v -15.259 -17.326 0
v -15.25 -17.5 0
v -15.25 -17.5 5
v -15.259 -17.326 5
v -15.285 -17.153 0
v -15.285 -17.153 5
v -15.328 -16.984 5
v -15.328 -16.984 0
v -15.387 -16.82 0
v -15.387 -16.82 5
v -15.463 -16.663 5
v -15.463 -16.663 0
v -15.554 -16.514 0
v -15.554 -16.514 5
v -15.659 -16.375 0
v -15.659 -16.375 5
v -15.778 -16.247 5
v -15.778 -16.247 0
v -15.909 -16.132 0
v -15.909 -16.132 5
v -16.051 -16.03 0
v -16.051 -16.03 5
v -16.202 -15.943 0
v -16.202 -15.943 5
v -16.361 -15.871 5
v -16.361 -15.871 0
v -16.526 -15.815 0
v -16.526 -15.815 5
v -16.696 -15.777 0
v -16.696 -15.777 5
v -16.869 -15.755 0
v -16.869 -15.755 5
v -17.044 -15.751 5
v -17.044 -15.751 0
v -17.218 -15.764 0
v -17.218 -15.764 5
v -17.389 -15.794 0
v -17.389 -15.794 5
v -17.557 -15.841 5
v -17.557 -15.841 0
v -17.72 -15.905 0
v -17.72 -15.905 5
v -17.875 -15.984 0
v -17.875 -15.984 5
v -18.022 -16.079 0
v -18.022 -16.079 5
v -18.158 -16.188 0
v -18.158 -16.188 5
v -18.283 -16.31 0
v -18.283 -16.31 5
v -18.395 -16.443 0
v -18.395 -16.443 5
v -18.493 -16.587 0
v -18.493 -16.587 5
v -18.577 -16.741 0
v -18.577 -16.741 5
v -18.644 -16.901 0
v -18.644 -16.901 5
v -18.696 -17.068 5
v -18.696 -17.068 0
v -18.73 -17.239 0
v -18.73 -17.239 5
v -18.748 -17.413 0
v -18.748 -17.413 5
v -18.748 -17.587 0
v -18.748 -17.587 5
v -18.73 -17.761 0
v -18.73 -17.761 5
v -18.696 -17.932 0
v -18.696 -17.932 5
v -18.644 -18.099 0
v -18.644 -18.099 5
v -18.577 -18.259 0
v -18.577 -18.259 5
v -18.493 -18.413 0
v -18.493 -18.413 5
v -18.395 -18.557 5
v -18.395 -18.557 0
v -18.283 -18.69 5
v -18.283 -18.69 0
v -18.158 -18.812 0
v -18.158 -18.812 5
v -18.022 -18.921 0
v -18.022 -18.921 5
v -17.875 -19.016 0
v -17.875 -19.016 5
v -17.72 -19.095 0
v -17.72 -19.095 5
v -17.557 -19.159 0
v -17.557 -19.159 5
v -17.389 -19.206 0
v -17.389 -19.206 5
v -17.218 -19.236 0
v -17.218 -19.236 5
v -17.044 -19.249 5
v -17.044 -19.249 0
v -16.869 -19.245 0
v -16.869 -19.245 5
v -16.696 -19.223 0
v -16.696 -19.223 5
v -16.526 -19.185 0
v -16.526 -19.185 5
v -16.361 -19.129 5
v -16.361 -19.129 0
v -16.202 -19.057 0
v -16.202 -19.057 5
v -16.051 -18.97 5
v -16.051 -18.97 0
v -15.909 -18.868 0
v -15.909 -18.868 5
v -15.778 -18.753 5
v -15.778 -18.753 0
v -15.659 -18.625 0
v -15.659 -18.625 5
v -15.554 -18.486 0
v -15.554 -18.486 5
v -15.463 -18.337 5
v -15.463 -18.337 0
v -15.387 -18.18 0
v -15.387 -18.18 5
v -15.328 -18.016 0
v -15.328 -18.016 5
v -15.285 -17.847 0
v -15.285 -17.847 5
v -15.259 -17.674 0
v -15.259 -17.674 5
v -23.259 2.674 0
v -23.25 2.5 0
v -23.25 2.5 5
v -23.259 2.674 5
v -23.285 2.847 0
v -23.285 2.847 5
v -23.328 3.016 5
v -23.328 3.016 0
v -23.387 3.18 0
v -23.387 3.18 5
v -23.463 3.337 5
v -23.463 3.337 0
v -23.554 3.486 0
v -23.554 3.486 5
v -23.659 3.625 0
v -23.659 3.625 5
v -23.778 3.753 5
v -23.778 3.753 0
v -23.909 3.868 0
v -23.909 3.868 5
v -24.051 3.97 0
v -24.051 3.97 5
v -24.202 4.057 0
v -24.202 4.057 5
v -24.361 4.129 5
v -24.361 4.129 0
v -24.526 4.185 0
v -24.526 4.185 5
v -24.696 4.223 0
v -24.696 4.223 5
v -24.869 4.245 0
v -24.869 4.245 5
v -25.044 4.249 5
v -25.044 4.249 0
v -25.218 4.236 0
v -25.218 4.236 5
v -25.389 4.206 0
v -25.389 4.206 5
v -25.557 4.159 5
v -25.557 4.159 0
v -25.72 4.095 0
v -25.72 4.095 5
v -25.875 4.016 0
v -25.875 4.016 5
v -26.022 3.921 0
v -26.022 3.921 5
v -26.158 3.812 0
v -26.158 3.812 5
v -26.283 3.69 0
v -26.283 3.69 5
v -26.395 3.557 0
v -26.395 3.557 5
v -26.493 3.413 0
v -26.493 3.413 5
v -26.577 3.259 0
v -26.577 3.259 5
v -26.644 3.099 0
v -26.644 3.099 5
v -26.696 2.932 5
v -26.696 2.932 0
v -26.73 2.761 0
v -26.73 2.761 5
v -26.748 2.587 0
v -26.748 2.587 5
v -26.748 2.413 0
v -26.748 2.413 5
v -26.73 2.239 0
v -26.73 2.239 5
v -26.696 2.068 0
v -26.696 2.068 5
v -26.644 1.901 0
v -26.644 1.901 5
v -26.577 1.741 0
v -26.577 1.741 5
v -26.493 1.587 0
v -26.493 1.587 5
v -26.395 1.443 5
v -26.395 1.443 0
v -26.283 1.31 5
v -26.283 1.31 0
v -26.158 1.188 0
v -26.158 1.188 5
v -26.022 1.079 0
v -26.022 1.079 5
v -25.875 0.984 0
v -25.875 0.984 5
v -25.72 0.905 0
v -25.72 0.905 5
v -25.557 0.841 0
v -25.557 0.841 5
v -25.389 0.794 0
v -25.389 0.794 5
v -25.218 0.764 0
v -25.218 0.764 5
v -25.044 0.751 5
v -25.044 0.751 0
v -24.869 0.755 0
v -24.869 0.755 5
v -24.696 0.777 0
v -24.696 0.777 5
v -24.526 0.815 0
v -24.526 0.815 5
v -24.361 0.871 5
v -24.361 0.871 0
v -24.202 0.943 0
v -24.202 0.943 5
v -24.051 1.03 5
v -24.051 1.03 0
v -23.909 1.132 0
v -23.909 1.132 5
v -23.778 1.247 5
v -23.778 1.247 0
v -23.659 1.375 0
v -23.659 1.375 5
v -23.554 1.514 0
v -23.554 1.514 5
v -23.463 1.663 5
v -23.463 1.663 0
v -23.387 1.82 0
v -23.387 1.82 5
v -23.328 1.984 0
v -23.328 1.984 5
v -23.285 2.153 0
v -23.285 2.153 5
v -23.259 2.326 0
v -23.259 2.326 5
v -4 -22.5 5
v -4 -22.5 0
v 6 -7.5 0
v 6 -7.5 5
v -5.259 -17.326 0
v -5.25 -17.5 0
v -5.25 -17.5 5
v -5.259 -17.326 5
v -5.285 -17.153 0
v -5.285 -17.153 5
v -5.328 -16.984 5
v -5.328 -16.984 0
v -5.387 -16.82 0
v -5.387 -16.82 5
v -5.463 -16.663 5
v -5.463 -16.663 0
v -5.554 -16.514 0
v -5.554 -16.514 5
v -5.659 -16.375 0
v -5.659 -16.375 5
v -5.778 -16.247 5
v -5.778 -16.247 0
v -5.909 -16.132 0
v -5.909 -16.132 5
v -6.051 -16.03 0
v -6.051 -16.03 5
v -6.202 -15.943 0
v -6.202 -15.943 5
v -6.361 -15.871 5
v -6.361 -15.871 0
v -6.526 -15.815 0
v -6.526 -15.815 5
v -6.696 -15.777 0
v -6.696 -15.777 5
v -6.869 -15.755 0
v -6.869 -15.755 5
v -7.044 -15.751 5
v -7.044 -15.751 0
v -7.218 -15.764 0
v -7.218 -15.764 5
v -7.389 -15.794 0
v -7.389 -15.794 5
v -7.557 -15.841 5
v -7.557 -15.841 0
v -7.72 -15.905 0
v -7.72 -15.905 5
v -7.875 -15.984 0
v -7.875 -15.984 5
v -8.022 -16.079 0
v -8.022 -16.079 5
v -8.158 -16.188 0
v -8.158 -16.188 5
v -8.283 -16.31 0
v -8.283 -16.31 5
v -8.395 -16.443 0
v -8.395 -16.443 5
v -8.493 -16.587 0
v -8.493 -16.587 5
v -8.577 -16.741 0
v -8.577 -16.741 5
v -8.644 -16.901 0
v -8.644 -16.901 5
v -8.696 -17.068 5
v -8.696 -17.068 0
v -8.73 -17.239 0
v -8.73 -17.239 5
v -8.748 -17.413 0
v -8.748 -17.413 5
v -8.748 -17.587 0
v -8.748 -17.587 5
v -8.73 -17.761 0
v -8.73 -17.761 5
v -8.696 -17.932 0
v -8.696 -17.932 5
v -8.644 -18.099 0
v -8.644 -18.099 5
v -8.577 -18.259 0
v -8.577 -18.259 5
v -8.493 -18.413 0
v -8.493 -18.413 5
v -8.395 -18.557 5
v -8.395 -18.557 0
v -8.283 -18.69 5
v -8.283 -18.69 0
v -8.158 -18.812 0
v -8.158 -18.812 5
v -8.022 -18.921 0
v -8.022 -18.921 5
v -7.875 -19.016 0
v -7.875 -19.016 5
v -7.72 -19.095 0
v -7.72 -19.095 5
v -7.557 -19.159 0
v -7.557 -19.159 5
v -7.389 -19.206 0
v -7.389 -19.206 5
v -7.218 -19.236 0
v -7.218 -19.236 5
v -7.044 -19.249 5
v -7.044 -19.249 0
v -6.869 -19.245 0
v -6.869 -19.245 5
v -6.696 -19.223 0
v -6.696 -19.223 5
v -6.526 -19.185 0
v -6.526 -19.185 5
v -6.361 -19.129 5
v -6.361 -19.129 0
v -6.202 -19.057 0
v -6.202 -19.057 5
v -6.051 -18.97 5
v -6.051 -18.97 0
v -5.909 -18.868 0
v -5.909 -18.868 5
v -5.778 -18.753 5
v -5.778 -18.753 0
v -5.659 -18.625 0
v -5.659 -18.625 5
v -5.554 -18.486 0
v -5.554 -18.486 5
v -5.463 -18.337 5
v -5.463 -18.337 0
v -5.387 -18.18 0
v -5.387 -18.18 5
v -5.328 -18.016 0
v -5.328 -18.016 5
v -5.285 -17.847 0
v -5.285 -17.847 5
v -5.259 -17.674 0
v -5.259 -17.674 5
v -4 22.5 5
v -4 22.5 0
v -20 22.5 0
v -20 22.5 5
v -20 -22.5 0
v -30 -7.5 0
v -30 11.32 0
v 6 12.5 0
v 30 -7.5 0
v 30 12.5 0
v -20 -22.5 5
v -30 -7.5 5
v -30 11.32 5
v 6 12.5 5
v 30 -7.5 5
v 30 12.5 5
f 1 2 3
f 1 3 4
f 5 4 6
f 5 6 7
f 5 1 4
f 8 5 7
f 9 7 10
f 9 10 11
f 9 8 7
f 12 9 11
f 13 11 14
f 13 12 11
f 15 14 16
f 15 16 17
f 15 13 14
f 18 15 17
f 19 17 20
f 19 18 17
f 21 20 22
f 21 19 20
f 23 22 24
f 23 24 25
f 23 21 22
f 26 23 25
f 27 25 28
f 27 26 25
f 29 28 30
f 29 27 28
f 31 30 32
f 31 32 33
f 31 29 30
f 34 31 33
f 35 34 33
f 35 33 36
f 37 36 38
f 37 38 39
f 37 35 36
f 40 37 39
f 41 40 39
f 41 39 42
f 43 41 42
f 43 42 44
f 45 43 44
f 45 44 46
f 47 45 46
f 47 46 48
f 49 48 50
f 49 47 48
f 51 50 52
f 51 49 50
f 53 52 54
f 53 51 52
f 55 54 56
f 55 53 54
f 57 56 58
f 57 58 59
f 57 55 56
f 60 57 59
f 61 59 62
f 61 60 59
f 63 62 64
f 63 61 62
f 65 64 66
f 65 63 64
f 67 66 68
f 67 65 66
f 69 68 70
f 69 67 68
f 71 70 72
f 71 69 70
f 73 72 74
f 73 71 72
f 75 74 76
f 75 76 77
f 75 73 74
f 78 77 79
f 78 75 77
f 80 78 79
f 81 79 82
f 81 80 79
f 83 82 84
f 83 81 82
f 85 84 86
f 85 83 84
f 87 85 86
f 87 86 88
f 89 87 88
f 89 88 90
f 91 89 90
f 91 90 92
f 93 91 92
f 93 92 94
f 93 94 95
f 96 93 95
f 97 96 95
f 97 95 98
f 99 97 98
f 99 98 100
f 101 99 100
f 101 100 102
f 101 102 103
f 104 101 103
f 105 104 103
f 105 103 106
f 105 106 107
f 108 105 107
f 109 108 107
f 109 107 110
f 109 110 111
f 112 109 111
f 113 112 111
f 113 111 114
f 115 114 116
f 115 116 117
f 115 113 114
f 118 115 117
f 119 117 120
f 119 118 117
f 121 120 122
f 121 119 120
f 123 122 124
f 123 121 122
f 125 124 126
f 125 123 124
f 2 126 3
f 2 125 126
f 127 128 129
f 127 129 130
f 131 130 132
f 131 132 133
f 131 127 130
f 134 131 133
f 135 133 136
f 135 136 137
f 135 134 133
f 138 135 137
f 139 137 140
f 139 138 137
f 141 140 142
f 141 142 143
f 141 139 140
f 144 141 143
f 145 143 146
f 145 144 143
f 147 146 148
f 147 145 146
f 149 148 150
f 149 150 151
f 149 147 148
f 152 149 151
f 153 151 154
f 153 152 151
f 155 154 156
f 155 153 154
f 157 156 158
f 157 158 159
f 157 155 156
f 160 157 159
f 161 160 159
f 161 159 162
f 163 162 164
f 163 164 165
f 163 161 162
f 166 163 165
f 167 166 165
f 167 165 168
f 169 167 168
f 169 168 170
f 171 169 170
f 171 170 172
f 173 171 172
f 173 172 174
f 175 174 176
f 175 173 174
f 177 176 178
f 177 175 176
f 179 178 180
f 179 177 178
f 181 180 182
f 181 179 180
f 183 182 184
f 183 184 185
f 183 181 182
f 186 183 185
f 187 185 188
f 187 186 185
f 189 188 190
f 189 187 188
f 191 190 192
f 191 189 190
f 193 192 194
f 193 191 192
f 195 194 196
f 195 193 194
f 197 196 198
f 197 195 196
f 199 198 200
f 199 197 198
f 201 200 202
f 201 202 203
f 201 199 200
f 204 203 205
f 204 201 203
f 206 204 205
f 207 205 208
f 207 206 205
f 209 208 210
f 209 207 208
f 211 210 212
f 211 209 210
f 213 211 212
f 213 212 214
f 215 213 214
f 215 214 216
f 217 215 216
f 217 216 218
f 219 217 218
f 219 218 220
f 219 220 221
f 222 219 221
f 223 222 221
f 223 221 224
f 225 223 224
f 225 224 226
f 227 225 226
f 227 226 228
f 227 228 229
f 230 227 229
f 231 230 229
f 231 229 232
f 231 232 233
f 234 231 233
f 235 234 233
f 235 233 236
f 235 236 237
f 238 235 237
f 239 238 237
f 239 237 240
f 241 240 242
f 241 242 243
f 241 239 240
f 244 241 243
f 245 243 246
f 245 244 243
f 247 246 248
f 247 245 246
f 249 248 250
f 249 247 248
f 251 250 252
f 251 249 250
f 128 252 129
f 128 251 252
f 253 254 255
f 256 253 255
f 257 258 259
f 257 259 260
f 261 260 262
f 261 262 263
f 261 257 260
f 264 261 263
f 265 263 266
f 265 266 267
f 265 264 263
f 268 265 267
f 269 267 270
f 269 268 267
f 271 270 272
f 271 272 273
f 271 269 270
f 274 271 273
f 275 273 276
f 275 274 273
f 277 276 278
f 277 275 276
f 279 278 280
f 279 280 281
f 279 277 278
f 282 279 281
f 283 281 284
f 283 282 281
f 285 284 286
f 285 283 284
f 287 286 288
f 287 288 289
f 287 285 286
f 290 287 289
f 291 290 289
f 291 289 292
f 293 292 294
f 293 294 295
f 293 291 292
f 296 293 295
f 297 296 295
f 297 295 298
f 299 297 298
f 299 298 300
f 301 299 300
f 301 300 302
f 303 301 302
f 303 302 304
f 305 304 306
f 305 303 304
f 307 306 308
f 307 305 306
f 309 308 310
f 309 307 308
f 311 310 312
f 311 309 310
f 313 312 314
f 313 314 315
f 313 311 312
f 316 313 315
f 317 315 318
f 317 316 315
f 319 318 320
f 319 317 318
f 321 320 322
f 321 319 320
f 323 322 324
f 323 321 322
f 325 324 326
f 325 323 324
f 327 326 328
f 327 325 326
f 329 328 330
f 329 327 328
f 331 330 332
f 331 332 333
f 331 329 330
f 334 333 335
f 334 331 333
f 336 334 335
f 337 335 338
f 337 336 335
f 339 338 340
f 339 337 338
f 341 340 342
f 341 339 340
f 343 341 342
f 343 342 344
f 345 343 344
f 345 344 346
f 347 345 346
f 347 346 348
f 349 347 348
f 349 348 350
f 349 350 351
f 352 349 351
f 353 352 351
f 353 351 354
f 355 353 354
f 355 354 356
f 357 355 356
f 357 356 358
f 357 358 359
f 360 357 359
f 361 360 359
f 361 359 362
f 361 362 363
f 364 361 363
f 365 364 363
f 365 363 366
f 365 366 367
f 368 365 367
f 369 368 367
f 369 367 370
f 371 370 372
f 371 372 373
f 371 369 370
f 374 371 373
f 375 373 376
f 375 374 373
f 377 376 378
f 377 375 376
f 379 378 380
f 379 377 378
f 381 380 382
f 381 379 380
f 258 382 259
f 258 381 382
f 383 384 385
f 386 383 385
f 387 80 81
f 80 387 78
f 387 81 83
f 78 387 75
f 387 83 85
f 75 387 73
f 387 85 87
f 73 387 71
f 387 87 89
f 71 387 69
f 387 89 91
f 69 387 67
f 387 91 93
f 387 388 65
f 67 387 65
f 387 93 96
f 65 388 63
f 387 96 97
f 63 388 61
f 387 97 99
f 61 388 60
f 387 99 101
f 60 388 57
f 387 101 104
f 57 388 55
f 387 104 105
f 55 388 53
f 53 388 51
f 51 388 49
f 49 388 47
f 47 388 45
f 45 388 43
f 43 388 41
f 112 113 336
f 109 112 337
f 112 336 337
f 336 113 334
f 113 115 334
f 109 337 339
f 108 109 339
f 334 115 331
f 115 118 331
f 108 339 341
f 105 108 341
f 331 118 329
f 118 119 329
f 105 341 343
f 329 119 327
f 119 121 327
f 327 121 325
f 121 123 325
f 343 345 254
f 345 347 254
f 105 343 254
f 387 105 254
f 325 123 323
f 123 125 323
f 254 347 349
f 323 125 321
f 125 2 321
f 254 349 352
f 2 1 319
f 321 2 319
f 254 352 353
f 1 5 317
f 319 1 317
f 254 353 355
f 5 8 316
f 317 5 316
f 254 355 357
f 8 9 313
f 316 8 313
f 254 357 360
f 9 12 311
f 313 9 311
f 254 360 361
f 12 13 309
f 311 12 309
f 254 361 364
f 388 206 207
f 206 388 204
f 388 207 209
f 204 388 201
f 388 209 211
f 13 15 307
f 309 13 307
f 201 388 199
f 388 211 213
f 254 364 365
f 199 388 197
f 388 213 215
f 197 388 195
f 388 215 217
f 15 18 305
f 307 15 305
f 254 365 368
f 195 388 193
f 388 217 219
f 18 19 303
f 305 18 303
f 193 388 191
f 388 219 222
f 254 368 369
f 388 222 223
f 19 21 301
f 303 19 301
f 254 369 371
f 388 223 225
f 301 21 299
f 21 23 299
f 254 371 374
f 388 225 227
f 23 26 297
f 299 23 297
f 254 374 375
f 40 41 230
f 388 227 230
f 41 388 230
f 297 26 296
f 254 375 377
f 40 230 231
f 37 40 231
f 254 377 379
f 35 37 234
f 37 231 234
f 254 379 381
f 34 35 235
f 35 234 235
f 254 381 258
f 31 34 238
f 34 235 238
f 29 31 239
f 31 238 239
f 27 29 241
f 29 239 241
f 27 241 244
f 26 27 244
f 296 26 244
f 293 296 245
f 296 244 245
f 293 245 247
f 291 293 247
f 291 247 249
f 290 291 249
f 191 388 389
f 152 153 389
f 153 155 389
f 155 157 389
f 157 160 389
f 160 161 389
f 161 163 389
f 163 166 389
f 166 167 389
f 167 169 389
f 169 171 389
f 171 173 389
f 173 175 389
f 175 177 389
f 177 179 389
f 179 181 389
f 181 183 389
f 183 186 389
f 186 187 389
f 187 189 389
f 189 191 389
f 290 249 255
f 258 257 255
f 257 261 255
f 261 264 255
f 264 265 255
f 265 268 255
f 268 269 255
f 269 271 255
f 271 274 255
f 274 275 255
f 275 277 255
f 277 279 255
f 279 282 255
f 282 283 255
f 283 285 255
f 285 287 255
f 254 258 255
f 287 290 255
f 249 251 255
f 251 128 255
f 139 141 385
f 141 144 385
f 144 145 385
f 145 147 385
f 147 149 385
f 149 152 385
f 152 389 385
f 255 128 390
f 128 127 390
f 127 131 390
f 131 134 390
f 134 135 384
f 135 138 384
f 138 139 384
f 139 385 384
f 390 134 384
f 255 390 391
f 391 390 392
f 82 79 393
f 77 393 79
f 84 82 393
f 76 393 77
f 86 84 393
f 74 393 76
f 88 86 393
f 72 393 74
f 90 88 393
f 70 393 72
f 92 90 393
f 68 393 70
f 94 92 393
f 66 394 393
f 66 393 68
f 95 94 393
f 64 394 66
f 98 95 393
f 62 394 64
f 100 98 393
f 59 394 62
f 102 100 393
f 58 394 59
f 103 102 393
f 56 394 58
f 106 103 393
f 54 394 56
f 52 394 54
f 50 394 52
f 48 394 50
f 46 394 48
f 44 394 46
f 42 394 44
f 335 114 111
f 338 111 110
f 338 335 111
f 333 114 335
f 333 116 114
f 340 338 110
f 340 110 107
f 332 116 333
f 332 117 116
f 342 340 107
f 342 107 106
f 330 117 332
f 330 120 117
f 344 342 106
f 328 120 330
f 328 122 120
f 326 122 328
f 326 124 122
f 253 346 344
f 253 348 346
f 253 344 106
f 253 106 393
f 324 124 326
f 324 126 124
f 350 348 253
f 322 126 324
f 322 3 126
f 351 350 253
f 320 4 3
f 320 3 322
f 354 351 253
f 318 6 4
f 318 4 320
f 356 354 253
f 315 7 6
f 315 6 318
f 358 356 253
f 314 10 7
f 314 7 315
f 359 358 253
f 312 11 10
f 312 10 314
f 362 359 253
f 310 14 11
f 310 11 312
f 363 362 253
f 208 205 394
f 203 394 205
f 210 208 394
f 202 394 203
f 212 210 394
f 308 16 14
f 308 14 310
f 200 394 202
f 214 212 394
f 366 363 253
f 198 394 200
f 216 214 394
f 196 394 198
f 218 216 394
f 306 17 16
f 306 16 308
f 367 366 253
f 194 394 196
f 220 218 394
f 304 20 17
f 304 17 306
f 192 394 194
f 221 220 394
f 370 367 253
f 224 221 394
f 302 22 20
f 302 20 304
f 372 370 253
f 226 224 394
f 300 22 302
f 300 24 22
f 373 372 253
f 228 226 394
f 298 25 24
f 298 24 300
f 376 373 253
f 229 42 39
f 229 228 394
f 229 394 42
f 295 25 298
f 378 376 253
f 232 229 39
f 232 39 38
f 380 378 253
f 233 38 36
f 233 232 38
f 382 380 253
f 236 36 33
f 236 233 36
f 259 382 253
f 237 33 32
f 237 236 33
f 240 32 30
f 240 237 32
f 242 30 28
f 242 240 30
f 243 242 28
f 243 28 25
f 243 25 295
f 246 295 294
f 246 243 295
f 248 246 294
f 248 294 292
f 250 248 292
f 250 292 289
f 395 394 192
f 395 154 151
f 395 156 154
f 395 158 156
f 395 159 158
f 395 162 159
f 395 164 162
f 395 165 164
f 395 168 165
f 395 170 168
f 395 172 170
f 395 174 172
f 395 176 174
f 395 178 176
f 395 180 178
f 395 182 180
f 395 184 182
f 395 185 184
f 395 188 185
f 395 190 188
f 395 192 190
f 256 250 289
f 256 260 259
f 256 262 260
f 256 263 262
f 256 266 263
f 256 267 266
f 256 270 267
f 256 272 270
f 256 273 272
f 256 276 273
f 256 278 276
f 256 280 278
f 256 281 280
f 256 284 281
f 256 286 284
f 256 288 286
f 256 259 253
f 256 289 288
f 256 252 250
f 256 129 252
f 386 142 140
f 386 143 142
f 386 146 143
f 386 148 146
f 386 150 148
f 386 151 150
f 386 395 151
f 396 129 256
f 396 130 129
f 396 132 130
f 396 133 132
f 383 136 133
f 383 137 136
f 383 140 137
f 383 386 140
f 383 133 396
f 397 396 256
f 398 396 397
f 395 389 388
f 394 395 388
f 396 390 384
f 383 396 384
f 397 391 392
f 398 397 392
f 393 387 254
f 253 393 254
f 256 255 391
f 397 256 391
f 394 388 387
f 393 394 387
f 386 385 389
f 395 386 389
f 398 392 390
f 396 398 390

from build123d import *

# Parameters (mm, degrees)
SKETCH1_W           = 7.2
SKETCH1_H           = 10.8
SKETCH1_R           = 1.75
BOSS_EXTRUDE3_DEPTH = 5
SKETCH2_W           = 50
SKETCH2_H           = 20
BOSS_EXTRUDE4_DEPTH = 5


with BuildPart() as part:
    # Sketch1 → Boss-Extrude3 (new body)
    with BuildSketch(Plane.XY):
        with Locations((10.9, 2.5)):
            Rectangle(SKETCH1_W, SKETCH1_H)
        Polygon((-20, 22.5), (-30, 11.319660113), (-30, -7.5), (-20, -22.5), (-4, -22.5), (6, -7.5), (30, -7.5), (30, 12.5), (6, 12.5), (-4, 22.5), align=None)
        with Locations((-17, -17.5)):
            Circle(SKETCH1_R, mode=Mode.SUBTRACT)
        with Locations((-7, -17.5)):
            Circle(SKETCH1_R, mode=Mode.SUBTRACT)
        with Locations((-25, 2.5)):
            Circle(SKETCH1_R, mode=Mode.SUBTRACT)
        Polygon((-3.5, 7.9), (7.3, 7.9), (14.5, 7.9), (14.5, -2.9), (7.3, -2.9), (-3.5, -2.9), align=None, mode=Mode.SUBTRACT)
    extrude(amount=BOSS_EXTRUDE3_DEPTH)

    # Sketch2 → Boss-Extrude4 (add)
    with BuildSketch(Plane(origin=(0, 0, 0), x_dir=(-1, 0, 0), z_dir=(0, 0, -1))):
        with Locations((-5, 2.5)):
            Rectangle(SKETCH2_W, SKETCH2_H)
    extrude(amount=-BOSS_EXTRUDE4_DEPTH)


solid = part.part
